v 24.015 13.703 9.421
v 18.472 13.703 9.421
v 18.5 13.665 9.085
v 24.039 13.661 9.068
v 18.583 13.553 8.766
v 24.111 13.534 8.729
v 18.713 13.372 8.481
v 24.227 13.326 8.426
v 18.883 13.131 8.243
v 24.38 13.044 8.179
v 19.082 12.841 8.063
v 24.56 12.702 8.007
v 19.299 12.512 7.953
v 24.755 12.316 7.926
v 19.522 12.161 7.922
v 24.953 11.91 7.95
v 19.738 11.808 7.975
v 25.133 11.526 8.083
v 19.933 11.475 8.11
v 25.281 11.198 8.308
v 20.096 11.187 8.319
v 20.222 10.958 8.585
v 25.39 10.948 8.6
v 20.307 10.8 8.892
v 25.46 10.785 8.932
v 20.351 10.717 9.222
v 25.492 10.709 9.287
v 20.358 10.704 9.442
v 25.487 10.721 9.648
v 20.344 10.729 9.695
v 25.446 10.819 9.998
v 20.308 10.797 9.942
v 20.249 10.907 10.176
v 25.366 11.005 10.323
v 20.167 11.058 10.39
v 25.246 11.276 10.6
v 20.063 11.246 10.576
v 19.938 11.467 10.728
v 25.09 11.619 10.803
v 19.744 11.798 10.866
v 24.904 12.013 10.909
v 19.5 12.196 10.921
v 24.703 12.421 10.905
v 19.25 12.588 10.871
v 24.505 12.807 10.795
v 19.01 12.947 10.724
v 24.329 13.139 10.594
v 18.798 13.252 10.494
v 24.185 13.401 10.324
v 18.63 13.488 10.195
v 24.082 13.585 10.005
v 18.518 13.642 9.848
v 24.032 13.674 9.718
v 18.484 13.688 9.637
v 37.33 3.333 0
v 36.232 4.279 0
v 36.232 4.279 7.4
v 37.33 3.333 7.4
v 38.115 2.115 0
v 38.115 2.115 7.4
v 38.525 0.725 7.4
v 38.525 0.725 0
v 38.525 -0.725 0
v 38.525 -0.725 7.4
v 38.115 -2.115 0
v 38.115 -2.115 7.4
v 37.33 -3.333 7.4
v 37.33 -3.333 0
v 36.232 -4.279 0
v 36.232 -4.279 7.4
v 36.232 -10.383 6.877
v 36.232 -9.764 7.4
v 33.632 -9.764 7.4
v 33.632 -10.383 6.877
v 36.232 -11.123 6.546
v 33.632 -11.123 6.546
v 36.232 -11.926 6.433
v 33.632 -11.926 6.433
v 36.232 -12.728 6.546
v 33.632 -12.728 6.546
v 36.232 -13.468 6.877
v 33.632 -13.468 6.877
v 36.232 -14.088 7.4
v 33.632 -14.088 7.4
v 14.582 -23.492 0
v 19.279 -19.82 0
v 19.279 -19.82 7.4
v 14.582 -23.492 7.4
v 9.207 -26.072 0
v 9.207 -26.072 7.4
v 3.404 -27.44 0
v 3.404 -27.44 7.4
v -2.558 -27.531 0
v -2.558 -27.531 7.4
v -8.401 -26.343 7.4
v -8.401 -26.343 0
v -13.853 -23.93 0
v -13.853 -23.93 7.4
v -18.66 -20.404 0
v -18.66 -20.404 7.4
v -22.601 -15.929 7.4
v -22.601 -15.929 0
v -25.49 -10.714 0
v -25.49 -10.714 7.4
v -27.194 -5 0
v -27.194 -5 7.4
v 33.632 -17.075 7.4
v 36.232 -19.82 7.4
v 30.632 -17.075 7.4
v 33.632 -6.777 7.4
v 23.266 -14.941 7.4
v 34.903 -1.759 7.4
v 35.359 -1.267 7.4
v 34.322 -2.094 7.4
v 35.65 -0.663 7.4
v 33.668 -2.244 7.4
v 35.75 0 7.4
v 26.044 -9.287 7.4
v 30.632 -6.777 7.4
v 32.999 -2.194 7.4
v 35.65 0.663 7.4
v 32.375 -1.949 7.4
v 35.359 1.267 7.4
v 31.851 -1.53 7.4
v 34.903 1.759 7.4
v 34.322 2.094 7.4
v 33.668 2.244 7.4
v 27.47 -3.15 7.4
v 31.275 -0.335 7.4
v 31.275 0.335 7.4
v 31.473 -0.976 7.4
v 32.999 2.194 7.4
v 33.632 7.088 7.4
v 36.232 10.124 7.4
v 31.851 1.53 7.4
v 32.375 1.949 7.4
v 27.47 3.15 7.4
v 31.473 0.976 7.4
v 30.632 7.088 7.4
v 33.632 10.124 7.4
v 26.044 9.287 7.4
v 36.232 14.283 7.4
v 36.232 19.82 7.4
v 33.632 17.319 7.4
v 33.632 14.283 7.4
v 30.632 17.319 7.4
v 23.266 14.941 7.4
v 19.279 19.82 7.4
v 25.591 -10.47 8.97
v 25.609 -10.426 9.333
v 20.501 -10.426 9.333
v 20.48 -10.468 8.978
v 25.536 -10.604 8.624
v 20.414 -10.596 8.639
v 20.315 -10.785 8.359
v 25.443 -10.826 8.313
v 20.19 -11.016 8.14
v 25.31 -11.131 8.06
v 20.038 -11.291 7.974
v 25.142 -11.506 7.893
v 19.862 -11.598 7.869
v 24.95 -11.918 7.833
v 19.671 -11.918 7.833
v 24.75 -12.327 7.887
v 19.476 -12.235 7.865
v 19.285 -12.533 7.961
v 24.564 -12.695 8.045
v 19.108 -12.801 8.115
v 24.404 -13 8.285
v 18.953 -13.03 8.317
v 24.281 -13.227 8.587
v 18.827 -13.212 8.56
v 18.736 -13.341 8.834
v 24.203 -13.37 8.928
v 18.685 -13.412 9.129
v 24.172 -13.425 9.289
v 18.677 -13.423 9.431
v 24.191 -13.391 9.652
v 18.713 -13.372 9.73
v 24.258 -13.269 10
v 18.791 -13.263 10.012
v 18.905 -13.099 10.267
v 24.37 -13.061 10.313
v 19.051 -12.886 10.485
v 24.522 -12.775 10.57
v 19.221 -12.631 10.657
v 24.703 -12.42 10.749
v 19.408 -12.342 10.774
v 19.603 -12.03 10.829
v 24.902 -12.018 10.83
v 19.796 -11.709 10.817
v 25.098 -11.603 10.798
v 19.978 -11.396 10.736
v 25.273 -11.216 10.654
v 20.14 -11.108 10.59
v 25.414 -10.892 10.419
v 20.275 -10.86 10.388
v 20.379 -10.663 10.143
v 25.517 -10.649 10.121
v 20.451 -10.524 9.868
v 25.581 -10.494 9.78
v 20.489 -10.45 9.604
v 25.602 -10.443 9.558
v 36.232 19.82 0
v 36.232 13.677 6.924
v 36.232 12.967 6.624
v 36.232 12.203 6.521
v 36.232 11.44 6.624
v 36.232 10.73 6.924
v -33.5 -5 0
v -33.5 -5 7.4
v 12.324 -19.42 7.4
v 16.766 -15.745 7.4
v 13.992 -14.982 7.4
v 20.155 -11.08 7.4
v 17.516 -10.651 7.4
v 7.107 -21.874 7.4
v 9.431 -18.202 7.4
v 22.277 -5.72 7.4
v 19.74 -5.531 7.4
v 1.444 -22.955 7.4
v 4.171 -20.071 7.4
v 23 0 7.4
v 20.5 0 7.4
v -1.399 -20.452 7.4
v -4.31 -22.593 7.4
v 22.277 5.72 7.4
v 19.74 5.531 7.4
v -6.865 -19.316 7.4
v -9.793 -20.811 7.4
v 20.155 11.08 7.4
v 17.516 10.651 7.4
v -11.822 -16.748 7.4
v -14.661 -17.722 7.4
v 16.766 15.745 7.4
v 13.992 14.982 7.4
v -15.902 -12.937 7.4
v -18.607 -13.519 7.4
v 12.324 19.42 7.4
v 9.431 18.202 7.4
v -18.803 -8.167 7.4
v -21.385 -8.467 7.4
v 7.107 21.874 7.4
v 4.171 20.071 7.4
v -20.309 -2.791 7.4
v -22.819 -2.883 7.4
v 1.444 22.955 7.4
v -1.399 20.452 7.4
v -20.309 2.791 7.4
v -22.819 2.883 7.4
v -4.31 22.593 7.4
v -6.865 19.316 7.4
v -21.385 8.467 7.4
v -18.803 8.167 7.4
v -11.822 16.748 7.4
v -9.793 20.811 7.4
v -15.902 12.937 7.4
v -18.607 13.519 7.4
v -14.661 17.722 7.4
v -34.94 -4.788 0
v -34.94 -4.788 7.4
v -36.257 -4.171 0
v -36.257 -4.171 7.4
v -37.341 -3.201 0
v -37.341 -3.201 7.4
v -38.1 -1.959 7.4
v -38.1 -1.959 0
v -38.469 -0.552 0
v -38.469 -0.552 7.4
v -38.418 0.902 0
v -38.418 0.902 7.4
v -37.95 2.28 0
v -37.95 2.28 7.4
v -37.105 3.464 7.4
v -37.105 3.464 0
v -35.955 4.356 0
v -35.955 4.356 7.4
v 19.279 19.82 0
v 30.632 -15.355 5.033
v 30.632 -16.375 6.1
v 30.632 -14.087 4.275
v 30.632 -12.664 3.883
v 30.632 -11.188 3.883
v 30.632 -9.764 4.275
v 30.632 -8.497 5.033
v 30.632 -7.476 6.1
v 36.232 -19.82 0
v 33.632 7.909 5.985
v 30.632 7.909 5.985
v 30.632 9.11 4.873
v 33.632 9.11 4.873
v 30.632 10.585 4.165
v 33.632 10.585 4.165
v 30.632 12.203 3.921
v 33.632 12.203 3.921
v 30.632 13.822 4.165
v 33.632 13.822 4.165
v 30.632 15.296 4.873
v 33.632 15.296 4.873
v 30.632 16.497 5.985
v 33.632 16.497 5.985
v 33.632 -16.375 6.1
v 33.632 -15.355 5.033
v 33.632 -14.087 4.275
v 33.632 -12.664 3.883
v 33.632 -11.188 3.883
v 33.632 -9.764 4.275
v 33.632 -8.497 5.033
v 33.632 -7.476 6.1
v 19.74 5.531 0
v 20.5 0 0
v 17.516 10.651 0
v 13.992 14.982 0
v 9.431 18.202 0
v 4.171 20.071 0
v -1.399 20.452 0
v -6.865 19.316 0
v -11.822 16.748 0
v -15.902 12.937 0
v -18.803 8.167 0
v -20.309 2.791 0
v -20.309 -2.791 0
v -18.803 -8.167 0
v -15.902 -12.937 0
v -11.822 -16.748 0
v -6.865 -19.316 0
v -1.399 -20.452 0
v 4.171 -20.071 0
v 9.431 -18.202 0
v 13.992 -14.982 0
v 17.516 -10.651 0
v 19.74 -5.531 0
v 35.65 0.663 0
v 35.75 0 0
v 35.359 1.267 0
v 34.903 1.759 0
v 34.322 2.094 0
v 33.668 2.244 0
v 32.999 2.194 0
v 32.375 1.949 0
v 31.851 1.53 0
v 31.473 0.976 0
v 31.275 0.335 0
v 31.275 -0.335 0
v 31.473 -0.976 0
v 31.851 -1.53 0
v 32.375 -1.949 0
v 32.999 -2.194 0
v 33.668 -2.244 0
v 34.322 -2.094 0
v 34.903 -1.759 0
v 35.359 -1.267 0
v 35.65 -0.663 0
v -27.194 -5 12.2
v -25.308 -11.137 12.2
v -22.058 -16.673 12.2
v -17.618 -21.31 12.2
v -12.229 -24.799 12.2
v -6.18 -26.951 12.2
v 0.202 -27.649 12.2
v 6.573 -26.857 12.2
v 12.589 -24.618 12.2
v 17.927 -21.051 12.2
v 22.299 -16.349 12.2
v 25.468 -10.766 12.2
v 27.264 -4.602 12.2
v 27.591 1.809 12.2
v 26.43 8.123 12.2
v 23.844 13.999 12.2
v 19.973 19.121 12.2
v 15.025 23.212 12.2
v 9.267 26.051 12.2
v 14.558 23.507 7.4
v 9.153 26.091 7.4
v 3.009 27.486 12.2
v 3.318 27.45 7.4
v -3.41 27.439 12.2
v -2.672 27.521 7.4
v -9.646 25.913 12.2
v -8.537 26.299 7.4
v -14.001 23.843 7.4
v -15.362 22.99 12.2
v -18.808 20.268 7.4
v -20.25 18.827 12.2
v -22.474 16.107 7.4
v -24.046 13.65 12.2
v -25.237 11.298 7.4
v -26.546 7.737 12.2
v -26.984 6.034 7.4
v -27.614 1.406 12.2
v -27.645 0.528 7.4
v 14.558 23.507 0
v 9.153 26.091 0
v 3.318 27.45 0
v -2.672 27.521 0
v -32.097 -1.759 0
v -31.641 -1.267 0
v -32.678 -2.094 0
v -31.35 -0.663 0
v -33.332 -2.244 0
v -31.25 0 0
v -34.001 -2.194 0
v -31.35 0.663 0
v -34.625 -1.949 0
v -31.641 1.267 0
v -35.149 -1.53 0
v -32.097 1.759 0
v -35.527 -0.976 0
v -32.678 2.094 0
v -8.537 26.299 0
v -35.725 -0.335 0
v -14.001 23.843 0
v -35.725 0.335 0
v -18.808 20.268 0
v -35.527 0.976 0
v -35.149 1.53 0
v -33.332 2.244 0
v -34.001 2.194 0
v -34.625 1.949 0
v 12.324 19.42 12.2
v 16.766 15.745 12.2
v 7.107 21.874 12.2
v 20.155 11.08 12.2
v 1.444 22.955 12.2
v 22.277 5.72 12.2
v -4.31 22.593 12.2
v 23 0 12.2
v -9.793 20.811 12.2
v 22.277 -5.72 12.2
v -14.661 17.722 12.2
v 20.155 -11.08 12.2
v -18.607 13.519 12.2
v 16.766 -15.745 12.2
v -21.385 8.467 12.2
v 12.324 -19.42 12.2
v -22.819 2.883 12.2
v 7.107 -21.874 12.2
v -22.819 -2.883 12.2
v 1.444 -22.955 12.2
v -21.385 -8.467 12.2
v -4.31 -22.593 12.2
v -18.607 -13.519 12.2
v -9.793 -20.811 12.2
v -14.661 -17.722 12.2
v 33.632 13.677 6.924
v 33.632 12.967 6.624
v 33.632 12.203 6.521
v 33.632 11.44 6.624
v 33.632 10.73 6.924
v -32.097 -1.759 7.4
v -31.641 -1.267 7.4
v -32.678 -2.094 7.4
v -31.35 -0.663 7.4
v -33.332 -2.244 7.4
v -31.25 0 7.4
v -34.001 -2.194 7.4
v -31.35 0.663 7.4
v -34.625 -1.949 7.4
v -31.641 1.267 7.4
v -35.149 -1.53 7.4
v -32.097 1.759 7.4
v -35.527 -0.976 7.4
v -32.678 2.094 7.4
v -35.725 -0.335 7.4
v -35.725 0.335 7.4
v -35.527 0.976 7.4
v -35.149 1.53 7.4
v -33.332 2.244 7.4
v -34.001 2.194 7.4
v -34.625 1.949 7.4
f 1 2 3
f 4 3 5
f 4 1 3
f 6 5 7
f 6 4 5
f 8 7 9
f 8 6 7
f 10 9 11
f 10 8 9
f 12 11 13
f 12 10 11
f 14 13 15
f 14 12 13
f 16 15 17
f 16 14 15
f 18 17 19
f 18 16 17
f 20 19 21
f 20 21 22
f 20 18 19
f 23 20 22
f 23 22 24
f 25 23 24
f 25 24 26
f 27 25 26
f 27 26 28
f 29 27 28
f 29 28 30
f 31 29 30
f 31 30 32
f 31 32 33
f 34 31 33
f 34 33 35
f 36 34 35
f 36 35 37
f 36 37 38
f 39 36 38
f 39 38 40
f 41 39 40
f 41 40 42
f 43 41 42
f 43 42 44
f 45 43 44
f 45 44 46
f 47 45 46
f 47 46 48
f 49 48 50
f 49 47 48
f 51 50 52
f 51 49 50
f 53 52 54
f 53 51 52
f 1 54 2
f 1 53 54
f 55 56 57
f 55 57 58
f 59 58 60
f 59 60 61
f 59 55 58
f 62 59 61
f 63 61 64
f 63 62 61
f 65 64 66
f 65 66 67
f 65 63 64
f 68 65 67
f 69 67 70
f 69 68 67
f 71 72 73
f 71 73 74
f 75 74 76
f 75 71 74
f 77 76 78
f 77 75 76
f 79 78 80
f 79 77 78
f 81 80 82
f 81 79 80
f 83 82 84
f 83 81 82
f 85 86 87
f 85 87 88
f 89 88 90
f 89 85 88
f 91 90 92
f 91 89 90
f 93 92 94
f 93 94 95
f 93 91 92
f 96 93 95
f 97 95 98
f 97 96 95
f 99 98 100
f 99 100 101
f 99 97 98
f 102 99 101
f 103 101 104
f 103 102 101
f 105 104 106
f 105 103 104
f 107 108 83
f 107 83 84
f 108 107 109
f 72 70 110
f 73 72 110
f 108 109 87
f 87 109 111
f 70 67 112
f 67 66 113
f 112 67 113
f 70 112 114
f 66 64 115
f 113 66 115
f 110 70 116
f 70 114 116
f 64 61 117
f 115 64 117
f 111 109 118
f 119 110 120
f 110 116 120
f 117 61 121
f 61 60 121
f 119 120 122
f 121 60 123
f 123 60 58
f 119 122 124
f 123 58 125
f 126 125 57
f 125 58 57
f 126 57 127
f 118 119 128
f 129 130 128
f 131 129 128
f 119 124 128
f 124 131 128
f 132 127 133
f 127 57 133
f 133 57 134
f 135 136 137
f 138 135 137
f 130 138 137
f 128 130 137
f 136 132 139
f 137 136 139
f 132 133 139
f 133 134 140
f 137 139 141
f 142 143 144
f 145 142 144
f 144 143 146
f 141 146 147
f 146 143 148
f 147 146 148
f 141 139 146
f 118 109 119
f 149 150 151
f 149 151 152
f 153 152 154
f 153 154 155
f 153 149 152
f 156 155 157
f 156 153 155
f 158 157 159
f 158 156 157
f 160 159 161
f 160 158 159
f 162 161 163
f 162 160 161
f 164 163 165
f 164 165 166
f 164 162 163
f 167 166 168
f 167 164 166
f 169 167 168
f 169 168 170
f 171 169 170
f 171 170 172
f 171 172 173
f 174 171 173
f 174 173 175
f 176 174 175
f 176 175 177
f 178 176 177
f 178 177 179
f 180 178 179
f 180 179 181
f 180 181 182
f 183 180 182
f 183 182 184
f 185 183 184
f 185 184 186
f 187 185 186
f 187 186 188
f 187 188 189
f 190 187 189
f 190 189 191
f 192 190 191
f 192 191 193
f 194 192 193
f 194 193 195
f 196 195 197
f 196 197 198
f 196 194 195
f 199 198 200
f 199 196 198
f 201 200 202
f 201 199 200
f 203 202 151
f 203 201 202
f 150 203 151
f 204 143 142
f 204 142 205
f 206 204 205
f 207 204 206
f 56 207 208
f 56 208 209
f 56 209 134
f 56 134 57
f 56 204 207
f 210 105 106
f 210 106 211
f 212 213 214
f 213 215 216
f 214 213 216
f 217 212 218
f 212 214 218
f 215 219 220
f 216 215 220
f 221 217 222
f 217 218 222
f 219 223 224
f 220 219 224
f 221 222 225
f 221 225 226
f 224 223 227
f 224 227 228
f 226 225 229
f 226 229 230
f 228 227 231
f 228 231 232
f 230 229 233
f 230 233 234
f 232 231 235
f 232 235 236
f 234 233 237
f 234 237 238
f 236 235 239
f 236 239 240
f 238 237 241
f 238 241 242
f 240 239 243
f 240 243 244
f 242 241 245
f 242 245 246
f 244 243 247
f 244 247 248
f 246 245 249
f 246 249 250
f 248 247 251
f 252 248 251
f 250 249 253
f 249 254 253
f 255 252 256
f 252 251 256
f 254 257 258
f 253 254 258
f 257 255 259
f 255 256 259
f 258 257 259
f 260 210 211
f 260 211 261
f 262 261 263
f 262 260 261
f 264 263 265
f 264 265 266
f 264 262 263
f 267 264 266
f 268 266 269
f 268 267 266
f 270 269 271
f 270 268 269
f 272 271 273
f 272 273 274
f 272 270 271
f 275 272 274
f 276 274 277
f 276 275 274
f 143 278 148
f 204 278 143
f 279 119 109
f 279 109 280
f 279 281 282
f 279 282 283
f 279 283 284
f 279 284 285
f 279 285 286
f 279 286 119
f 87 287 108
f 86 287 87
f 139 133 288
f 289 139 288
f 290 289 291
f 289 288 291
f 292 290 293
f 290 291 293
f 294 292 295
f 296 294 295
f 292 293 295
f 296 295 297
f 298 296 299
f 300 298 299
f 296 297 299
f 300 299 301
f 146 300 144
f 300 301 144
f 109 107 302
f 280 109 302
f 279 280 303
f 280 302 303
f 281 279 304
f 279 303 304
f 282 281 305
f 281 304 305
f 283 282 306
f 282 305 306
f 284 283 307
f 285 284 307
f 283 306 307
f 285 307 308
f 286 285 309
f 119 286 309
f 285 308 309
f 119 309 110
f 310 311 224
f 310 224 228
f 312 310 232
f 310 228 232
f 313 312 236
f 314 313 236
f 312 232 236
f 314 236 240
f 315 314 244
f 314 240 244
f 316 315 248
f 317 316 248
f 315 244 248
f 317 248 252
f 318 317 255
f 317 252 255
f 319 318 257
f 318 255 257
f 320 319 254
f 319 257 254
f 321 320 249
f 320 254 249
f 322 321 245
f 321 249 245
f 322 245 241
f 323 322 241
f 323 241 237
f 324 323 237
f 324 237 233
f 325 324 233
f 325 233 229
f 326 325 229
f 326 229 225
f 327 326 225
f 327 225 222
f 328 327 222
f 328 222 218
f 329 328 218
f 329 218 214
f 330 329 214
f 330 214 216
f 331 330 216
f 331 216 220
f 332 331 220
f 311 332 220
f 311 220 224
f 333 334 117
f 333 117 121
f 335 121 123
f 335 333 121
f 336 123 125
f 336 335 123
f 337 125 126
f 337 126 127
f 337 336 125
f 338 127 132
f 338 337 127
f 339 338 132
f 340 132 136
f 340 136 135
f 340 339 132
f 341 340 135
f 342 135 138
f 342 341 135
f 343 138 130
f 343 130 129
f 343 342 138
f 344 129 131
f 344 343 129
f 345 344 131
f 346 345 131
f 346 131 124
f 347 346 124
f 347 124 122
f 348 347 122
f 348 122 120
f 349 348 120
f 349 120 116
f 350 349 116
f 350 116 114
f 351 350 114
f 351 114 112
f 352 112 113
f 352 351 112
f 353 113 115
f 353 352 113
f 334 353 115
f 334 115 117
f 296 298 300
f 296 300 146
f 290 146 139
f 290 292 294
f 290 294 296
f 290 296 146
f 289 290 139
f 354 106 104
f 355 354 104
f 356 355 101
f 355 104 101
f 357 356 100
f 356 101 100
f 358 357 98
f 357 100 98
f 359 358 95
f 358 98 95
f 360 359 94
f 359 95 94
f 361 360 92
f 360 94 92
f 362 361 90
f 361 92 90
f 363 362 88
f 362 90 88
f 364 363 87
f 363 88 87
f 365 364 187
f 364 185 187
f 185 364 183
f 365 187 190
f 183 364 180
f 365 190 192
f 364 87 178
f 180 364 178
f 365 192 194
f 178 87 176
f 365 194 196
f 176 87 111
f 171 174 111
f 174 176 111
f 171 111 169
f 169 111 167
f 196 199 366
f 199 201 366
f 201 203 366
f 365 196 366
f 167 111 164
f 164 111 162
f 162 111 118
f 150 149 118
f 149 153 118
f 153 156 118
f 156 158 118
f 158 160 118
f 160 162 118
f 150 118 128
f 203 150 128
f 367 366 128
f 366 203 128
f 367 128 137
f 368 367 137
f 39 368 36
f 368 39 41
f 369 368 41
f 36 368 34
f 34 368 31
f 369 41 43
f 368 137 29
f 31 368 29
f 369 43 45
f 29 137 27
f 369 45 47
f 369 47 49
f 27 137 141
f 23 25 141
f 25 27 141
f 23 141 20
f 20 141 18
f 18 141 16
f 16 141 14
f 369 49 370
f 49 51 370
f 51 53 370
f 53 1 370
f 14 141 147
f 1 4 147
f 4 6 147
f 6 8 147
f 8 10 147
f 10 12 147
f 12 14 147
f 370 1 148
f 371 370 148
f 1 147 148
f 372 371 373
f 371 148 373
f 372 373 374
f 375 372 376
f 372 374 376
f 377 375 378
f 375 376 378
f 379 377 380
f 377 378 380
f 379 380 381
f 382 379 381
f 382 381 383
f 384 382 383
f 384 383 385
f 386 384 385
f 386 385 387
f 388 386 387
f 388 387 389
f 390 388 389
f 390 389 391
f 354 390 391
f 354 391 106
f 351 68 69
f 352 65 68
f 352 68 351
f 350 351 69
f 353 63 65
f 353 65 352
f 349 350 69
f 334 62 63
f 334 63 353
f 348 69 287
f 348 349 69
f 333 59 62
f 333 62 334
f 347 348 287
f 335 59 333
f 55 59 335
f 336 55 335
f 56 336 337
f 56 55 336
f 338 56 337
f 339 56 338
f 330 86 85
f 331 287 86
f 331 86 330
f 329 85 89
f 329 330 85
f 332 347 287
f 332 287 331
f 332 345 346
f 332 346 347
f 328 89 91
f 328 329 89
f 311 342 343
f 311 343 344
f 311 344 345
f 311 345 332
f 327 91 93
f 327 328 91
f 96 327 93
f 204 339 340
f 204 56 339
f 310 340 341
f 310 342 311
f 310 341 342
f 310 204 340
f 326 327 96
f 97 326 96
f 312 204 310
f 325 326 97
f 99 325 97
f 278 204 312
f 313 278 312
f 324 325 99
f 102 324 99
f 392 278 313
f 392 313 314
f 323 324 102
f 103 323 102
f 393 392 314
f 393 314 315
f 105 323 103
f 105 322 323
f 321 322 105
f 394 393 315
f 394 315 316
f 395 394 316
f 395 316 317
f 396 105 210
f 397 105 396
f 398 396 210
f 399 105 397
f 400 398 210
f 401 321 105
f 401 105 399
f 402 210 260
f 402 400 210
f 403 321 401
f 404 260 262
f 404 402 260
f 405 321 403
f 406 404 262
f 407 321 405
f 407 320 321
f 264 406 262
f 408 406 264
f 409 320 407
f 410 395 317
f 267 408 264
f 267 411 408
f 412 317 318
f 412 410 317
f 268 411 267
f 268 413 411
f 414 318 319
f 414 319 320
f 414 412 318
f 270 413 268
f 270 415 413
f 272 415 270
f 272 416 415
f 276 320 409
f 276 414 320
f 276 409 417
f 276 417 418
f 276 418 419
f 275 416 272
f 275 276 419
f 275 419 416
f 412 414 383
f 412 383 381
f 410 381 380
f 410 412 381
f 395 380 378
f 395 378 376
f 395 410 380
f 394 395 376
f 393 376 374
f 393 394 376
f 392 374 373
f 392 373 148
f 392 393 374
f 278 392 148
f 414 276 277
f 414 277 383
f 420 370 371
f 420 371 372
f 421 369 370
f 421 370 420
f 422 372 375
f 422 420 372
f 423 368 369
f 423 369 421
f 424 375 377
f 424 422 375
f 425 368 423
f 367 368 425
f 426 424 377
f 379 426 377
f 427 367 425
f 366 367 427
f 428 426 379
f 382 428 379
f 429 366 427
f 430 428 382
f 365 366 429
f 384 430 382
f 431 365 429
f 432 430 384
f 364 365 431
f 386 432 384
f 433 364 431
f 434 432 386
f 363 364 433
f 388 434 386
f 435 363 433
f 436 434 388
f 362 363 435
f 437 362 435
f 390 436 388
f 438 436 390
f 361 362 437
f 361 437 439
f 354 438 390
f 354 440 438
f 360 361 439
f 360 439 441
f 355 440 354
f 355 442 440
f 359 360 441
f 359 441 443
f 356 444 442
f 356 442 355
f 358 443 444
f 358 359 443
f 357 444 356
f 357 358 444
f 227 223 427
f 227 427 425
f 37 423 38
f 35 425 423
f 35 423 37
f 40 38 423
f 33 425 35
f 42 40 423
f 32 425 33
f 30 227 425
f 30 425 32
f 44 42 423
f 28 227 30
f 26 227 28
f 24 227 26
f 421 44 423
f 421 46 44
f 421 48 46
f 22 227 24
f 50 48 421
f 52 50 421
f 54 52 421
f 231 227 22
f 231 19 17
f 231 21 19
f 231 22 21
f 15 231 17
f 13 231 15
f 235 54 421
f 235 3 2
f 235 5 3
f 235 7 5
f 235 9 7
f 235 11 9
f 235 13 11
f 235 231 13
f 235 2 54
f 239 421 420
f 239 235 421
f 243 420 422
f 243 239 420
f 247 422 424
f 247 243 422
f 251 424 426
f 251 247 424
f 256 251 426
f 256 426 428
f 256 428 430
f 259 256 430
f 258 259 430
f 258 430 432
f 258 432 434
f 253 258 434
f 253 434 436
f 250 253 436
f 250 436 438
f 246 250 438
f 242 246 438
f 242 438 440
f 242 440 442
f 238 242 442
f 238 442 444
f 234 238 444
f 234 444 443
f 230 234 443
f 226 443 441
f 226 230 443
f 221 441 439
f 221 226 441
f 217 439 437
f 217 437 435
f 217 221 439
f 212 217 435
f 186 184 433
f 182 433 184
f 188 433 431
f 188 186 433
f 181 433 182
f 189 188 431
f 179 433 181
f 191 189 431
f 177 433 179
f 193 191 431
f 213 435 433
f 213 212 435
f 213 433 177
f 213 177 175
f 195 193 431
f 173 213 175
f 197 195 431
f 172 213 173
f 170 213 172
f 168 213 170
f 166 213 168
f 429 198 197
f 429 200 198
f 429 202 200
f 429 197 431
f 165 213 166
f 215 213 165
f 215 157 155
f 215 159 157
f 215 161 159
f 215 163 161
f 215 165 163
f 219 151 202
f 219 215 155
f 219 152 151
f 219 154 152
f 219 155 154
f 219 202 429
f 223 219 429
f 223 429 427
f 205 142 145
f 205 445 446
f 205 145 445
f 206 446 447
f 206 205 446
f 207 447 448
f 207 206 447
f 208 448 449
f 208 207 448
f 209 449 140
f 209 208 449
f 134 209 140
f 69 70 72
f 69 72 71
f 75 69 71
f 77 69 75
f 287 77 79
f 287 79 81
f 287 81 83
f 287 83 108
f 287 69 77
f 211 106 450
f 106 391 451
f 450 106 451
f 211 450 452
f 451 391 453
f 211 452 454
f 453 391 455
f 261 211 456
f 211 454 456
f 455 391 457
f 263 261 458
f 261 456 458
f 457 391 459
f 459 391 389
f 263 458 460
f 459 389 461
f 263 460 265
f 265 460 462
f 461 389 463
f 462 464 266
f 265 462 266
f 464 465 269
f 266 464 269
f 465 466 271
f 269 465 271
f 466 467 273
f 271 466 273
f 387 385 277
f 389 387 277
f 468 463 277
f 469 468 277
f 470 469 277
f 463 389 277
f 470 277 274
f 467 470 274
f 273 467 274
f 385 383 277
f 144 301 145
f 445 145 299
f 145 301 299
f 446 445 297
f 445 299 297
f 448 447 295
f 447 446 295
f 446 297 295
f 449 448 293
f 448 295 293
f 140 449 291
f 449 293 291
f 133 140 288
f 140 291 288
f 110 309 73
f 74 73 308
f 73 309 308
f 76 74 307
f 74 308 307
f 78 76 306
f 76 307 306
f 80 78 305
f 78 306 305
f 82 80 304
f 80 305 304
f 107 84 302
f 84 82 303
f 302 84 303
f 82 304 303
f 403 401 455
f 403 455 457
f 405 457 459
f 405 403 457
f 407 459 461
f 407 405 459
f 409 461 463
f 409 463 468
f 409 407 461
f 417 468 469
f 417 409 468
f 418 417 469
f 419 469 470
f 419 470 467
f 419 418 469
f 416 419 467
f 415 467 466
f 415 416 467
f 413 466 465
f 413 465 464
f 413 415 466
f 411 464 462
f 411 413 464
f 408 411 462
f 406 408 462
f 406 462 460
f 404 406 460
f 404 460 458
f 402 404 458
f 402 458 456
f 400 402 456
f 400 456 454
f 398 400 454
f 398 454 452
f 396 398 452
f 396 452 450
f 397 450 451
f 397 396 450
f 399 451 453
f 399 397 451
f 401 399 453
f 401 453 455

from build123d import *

# Parameters (mm, degrees)
CROQUIS1_R                 = 2.25
SALIENTE_EXTRUIR1_DEPTH    = 7.4
CROQUIS4_R                 = 5.5
CORTAR_EXTRUIR2_DEPTH      = 3
CROQUIS5_R                 = 2.9
CORTAR_EXTRUIR3_DEPTH      = 4
CROQUIS2_R                 = 20.5
CORTAR_EXTRUIR1_DEPTH      = 49.036098674
CROQUIS3_R                 = 27.65
CROQUIS3_R_2               = 23
SALIENTE_EXTRUIR2_DEPTH    = 4.8
CORTAR_EXTRUIR4_DEPTH      = 20
CORTAR_EXTRUIR4_DEPTH_BACK = 9
CROQUIS6_R                 = 1.5


with BuildPart() as part:
    # Croquis1 → Saliente-Extruir1 (new body)
    with BuildSketch(Plane.XY):
        with BuildLine():
            Line((-35.955174002, 4.355699785), (-18.80791724, 20.267825466))
            ThreePointArc((-18.80791724, 20.267825466), (0.325119352, 27.648088495), (19.279317337, 19.819950126))
            Line((19.279317337, 19.819950126), (36.231616172, 19.819950126))
            Line((36.231616172, 19.819950126), (36.231616172, 4.279499518))
            ThreePointArc((36.231616172, 4.279499518), (38.576991534, 0), (36.231616172, -4.279499518))
            Line((36.231616172, -4.279499518), (36.231616172, -19.819950126))
            Line((36.231616172, -19.819950126), (19.279317337, -19.819950126))
            ThreePointArc((19.279317337, -19.819950126), (-8.400531281, -26.34299858), (-27.194162977, -5))
            Line((-27.194162977, -5), (-33.5, -5))
            ThreePointArc((-33.5, -5), (-38.336243321, -1.269153473), (-35.955174002, 4.355699785))
        make_face()
        with Locations((-33.5, 0)):
            Circle(CROQUIS1_R, mode=Mode.SUBTRACT)
        with Locations((33.5, 0)):
            Circle(CROQUIS1_R, mode=Mode.SUBTRACT)
    extrude(amount=SALIENTE_EXTRUIR1_DEPTH)

    # Croquis4 → Cortar-Extruir2 (cut)
    with BuildSketch(Plane(origin=(33.631616172, 0, 0), x_dir=(0, -0.9996578345310084, -0.026157481927263488), z_dir=(1, 0, 0))):
        with Locations((-12.445697835, -9.09891785)):
            Circle(CROQUIS4_R)
        with Locations((11.67759578, -9.64152027)):
            Circle(CROQUIS4_R)
    extrude(amount=-CORTAR_EXTRUIR2_DEPTH, mode=Mode.SUBTRACT)

    # Croquis5 → Cortar-Extruir3 (cut)
    with BuildSketch(Plane(origin=(36.231616172, 0, 0), x_dir=(0, -1, 0), z_dir=(-1, 0, 0))):
        with Locations((-12.203434568, 9.42135263)):
            Circle(CROQUIS5_R)
        with Locations((11.925798003, 9.332764774)):
            Circle(CROQUIS5_R)
    extrude(amount=CORTAR_EXTRUIR3_DEPTH, mode=Mode.SUBTRACT)

    # Croquis2 → Cortar-Extruir1 (cut, through all)
    with BuildSketch(Plane.XY.offset(7.4)):
        Circle(CROQUIS2_R)
    extrude(amount=-CORTAR_EXTRUIR1_DEPTH, mode=Mode.SUBTRACT)

    # Croquis3 → Saliente-Extruir2 (add)
    with BuildSketch(Plane.XY.offset(7.4)):
        with Locations(Location((0, 0, 0), (0, 0, 190.41821508))):
            Circle(CROQUIS3_R)
        Circle(CROQUIS3_R_2, mode=Mode.SUBTRACT)
    extrude(amount=SALIENTE_EXTRUIR2_DEPTH)

    # Croquis6 → Cortar-Extruir4 (cut, two sides: drawn at the far end of the back side and taken through both)
    with BuildSketch(Plane(origin=(26.031616172, 0, 0), x_dir=(0, -1, 0), z_dir=(-1, 0, 0)).offset(-CORTAR_EXTRUIR4_DEPTH_BACK)):
        with Locations(Location((-12.203434568, 9.42135263, 0), (0, 0, 180))):
            Circle(CROQUIS6_R)
        with Locations(Location((11.925798003, 9.332764774, 0), (0, 0, 180))):
            Circle(CROQUIS6_R)
    extrude(amount=CORTAR_EXTRUIR4_DEPTH + CORTAR_EXTRUIR4_DEPTH_BACK, mode=Mode.SUBTRACT)


solid = part.part
